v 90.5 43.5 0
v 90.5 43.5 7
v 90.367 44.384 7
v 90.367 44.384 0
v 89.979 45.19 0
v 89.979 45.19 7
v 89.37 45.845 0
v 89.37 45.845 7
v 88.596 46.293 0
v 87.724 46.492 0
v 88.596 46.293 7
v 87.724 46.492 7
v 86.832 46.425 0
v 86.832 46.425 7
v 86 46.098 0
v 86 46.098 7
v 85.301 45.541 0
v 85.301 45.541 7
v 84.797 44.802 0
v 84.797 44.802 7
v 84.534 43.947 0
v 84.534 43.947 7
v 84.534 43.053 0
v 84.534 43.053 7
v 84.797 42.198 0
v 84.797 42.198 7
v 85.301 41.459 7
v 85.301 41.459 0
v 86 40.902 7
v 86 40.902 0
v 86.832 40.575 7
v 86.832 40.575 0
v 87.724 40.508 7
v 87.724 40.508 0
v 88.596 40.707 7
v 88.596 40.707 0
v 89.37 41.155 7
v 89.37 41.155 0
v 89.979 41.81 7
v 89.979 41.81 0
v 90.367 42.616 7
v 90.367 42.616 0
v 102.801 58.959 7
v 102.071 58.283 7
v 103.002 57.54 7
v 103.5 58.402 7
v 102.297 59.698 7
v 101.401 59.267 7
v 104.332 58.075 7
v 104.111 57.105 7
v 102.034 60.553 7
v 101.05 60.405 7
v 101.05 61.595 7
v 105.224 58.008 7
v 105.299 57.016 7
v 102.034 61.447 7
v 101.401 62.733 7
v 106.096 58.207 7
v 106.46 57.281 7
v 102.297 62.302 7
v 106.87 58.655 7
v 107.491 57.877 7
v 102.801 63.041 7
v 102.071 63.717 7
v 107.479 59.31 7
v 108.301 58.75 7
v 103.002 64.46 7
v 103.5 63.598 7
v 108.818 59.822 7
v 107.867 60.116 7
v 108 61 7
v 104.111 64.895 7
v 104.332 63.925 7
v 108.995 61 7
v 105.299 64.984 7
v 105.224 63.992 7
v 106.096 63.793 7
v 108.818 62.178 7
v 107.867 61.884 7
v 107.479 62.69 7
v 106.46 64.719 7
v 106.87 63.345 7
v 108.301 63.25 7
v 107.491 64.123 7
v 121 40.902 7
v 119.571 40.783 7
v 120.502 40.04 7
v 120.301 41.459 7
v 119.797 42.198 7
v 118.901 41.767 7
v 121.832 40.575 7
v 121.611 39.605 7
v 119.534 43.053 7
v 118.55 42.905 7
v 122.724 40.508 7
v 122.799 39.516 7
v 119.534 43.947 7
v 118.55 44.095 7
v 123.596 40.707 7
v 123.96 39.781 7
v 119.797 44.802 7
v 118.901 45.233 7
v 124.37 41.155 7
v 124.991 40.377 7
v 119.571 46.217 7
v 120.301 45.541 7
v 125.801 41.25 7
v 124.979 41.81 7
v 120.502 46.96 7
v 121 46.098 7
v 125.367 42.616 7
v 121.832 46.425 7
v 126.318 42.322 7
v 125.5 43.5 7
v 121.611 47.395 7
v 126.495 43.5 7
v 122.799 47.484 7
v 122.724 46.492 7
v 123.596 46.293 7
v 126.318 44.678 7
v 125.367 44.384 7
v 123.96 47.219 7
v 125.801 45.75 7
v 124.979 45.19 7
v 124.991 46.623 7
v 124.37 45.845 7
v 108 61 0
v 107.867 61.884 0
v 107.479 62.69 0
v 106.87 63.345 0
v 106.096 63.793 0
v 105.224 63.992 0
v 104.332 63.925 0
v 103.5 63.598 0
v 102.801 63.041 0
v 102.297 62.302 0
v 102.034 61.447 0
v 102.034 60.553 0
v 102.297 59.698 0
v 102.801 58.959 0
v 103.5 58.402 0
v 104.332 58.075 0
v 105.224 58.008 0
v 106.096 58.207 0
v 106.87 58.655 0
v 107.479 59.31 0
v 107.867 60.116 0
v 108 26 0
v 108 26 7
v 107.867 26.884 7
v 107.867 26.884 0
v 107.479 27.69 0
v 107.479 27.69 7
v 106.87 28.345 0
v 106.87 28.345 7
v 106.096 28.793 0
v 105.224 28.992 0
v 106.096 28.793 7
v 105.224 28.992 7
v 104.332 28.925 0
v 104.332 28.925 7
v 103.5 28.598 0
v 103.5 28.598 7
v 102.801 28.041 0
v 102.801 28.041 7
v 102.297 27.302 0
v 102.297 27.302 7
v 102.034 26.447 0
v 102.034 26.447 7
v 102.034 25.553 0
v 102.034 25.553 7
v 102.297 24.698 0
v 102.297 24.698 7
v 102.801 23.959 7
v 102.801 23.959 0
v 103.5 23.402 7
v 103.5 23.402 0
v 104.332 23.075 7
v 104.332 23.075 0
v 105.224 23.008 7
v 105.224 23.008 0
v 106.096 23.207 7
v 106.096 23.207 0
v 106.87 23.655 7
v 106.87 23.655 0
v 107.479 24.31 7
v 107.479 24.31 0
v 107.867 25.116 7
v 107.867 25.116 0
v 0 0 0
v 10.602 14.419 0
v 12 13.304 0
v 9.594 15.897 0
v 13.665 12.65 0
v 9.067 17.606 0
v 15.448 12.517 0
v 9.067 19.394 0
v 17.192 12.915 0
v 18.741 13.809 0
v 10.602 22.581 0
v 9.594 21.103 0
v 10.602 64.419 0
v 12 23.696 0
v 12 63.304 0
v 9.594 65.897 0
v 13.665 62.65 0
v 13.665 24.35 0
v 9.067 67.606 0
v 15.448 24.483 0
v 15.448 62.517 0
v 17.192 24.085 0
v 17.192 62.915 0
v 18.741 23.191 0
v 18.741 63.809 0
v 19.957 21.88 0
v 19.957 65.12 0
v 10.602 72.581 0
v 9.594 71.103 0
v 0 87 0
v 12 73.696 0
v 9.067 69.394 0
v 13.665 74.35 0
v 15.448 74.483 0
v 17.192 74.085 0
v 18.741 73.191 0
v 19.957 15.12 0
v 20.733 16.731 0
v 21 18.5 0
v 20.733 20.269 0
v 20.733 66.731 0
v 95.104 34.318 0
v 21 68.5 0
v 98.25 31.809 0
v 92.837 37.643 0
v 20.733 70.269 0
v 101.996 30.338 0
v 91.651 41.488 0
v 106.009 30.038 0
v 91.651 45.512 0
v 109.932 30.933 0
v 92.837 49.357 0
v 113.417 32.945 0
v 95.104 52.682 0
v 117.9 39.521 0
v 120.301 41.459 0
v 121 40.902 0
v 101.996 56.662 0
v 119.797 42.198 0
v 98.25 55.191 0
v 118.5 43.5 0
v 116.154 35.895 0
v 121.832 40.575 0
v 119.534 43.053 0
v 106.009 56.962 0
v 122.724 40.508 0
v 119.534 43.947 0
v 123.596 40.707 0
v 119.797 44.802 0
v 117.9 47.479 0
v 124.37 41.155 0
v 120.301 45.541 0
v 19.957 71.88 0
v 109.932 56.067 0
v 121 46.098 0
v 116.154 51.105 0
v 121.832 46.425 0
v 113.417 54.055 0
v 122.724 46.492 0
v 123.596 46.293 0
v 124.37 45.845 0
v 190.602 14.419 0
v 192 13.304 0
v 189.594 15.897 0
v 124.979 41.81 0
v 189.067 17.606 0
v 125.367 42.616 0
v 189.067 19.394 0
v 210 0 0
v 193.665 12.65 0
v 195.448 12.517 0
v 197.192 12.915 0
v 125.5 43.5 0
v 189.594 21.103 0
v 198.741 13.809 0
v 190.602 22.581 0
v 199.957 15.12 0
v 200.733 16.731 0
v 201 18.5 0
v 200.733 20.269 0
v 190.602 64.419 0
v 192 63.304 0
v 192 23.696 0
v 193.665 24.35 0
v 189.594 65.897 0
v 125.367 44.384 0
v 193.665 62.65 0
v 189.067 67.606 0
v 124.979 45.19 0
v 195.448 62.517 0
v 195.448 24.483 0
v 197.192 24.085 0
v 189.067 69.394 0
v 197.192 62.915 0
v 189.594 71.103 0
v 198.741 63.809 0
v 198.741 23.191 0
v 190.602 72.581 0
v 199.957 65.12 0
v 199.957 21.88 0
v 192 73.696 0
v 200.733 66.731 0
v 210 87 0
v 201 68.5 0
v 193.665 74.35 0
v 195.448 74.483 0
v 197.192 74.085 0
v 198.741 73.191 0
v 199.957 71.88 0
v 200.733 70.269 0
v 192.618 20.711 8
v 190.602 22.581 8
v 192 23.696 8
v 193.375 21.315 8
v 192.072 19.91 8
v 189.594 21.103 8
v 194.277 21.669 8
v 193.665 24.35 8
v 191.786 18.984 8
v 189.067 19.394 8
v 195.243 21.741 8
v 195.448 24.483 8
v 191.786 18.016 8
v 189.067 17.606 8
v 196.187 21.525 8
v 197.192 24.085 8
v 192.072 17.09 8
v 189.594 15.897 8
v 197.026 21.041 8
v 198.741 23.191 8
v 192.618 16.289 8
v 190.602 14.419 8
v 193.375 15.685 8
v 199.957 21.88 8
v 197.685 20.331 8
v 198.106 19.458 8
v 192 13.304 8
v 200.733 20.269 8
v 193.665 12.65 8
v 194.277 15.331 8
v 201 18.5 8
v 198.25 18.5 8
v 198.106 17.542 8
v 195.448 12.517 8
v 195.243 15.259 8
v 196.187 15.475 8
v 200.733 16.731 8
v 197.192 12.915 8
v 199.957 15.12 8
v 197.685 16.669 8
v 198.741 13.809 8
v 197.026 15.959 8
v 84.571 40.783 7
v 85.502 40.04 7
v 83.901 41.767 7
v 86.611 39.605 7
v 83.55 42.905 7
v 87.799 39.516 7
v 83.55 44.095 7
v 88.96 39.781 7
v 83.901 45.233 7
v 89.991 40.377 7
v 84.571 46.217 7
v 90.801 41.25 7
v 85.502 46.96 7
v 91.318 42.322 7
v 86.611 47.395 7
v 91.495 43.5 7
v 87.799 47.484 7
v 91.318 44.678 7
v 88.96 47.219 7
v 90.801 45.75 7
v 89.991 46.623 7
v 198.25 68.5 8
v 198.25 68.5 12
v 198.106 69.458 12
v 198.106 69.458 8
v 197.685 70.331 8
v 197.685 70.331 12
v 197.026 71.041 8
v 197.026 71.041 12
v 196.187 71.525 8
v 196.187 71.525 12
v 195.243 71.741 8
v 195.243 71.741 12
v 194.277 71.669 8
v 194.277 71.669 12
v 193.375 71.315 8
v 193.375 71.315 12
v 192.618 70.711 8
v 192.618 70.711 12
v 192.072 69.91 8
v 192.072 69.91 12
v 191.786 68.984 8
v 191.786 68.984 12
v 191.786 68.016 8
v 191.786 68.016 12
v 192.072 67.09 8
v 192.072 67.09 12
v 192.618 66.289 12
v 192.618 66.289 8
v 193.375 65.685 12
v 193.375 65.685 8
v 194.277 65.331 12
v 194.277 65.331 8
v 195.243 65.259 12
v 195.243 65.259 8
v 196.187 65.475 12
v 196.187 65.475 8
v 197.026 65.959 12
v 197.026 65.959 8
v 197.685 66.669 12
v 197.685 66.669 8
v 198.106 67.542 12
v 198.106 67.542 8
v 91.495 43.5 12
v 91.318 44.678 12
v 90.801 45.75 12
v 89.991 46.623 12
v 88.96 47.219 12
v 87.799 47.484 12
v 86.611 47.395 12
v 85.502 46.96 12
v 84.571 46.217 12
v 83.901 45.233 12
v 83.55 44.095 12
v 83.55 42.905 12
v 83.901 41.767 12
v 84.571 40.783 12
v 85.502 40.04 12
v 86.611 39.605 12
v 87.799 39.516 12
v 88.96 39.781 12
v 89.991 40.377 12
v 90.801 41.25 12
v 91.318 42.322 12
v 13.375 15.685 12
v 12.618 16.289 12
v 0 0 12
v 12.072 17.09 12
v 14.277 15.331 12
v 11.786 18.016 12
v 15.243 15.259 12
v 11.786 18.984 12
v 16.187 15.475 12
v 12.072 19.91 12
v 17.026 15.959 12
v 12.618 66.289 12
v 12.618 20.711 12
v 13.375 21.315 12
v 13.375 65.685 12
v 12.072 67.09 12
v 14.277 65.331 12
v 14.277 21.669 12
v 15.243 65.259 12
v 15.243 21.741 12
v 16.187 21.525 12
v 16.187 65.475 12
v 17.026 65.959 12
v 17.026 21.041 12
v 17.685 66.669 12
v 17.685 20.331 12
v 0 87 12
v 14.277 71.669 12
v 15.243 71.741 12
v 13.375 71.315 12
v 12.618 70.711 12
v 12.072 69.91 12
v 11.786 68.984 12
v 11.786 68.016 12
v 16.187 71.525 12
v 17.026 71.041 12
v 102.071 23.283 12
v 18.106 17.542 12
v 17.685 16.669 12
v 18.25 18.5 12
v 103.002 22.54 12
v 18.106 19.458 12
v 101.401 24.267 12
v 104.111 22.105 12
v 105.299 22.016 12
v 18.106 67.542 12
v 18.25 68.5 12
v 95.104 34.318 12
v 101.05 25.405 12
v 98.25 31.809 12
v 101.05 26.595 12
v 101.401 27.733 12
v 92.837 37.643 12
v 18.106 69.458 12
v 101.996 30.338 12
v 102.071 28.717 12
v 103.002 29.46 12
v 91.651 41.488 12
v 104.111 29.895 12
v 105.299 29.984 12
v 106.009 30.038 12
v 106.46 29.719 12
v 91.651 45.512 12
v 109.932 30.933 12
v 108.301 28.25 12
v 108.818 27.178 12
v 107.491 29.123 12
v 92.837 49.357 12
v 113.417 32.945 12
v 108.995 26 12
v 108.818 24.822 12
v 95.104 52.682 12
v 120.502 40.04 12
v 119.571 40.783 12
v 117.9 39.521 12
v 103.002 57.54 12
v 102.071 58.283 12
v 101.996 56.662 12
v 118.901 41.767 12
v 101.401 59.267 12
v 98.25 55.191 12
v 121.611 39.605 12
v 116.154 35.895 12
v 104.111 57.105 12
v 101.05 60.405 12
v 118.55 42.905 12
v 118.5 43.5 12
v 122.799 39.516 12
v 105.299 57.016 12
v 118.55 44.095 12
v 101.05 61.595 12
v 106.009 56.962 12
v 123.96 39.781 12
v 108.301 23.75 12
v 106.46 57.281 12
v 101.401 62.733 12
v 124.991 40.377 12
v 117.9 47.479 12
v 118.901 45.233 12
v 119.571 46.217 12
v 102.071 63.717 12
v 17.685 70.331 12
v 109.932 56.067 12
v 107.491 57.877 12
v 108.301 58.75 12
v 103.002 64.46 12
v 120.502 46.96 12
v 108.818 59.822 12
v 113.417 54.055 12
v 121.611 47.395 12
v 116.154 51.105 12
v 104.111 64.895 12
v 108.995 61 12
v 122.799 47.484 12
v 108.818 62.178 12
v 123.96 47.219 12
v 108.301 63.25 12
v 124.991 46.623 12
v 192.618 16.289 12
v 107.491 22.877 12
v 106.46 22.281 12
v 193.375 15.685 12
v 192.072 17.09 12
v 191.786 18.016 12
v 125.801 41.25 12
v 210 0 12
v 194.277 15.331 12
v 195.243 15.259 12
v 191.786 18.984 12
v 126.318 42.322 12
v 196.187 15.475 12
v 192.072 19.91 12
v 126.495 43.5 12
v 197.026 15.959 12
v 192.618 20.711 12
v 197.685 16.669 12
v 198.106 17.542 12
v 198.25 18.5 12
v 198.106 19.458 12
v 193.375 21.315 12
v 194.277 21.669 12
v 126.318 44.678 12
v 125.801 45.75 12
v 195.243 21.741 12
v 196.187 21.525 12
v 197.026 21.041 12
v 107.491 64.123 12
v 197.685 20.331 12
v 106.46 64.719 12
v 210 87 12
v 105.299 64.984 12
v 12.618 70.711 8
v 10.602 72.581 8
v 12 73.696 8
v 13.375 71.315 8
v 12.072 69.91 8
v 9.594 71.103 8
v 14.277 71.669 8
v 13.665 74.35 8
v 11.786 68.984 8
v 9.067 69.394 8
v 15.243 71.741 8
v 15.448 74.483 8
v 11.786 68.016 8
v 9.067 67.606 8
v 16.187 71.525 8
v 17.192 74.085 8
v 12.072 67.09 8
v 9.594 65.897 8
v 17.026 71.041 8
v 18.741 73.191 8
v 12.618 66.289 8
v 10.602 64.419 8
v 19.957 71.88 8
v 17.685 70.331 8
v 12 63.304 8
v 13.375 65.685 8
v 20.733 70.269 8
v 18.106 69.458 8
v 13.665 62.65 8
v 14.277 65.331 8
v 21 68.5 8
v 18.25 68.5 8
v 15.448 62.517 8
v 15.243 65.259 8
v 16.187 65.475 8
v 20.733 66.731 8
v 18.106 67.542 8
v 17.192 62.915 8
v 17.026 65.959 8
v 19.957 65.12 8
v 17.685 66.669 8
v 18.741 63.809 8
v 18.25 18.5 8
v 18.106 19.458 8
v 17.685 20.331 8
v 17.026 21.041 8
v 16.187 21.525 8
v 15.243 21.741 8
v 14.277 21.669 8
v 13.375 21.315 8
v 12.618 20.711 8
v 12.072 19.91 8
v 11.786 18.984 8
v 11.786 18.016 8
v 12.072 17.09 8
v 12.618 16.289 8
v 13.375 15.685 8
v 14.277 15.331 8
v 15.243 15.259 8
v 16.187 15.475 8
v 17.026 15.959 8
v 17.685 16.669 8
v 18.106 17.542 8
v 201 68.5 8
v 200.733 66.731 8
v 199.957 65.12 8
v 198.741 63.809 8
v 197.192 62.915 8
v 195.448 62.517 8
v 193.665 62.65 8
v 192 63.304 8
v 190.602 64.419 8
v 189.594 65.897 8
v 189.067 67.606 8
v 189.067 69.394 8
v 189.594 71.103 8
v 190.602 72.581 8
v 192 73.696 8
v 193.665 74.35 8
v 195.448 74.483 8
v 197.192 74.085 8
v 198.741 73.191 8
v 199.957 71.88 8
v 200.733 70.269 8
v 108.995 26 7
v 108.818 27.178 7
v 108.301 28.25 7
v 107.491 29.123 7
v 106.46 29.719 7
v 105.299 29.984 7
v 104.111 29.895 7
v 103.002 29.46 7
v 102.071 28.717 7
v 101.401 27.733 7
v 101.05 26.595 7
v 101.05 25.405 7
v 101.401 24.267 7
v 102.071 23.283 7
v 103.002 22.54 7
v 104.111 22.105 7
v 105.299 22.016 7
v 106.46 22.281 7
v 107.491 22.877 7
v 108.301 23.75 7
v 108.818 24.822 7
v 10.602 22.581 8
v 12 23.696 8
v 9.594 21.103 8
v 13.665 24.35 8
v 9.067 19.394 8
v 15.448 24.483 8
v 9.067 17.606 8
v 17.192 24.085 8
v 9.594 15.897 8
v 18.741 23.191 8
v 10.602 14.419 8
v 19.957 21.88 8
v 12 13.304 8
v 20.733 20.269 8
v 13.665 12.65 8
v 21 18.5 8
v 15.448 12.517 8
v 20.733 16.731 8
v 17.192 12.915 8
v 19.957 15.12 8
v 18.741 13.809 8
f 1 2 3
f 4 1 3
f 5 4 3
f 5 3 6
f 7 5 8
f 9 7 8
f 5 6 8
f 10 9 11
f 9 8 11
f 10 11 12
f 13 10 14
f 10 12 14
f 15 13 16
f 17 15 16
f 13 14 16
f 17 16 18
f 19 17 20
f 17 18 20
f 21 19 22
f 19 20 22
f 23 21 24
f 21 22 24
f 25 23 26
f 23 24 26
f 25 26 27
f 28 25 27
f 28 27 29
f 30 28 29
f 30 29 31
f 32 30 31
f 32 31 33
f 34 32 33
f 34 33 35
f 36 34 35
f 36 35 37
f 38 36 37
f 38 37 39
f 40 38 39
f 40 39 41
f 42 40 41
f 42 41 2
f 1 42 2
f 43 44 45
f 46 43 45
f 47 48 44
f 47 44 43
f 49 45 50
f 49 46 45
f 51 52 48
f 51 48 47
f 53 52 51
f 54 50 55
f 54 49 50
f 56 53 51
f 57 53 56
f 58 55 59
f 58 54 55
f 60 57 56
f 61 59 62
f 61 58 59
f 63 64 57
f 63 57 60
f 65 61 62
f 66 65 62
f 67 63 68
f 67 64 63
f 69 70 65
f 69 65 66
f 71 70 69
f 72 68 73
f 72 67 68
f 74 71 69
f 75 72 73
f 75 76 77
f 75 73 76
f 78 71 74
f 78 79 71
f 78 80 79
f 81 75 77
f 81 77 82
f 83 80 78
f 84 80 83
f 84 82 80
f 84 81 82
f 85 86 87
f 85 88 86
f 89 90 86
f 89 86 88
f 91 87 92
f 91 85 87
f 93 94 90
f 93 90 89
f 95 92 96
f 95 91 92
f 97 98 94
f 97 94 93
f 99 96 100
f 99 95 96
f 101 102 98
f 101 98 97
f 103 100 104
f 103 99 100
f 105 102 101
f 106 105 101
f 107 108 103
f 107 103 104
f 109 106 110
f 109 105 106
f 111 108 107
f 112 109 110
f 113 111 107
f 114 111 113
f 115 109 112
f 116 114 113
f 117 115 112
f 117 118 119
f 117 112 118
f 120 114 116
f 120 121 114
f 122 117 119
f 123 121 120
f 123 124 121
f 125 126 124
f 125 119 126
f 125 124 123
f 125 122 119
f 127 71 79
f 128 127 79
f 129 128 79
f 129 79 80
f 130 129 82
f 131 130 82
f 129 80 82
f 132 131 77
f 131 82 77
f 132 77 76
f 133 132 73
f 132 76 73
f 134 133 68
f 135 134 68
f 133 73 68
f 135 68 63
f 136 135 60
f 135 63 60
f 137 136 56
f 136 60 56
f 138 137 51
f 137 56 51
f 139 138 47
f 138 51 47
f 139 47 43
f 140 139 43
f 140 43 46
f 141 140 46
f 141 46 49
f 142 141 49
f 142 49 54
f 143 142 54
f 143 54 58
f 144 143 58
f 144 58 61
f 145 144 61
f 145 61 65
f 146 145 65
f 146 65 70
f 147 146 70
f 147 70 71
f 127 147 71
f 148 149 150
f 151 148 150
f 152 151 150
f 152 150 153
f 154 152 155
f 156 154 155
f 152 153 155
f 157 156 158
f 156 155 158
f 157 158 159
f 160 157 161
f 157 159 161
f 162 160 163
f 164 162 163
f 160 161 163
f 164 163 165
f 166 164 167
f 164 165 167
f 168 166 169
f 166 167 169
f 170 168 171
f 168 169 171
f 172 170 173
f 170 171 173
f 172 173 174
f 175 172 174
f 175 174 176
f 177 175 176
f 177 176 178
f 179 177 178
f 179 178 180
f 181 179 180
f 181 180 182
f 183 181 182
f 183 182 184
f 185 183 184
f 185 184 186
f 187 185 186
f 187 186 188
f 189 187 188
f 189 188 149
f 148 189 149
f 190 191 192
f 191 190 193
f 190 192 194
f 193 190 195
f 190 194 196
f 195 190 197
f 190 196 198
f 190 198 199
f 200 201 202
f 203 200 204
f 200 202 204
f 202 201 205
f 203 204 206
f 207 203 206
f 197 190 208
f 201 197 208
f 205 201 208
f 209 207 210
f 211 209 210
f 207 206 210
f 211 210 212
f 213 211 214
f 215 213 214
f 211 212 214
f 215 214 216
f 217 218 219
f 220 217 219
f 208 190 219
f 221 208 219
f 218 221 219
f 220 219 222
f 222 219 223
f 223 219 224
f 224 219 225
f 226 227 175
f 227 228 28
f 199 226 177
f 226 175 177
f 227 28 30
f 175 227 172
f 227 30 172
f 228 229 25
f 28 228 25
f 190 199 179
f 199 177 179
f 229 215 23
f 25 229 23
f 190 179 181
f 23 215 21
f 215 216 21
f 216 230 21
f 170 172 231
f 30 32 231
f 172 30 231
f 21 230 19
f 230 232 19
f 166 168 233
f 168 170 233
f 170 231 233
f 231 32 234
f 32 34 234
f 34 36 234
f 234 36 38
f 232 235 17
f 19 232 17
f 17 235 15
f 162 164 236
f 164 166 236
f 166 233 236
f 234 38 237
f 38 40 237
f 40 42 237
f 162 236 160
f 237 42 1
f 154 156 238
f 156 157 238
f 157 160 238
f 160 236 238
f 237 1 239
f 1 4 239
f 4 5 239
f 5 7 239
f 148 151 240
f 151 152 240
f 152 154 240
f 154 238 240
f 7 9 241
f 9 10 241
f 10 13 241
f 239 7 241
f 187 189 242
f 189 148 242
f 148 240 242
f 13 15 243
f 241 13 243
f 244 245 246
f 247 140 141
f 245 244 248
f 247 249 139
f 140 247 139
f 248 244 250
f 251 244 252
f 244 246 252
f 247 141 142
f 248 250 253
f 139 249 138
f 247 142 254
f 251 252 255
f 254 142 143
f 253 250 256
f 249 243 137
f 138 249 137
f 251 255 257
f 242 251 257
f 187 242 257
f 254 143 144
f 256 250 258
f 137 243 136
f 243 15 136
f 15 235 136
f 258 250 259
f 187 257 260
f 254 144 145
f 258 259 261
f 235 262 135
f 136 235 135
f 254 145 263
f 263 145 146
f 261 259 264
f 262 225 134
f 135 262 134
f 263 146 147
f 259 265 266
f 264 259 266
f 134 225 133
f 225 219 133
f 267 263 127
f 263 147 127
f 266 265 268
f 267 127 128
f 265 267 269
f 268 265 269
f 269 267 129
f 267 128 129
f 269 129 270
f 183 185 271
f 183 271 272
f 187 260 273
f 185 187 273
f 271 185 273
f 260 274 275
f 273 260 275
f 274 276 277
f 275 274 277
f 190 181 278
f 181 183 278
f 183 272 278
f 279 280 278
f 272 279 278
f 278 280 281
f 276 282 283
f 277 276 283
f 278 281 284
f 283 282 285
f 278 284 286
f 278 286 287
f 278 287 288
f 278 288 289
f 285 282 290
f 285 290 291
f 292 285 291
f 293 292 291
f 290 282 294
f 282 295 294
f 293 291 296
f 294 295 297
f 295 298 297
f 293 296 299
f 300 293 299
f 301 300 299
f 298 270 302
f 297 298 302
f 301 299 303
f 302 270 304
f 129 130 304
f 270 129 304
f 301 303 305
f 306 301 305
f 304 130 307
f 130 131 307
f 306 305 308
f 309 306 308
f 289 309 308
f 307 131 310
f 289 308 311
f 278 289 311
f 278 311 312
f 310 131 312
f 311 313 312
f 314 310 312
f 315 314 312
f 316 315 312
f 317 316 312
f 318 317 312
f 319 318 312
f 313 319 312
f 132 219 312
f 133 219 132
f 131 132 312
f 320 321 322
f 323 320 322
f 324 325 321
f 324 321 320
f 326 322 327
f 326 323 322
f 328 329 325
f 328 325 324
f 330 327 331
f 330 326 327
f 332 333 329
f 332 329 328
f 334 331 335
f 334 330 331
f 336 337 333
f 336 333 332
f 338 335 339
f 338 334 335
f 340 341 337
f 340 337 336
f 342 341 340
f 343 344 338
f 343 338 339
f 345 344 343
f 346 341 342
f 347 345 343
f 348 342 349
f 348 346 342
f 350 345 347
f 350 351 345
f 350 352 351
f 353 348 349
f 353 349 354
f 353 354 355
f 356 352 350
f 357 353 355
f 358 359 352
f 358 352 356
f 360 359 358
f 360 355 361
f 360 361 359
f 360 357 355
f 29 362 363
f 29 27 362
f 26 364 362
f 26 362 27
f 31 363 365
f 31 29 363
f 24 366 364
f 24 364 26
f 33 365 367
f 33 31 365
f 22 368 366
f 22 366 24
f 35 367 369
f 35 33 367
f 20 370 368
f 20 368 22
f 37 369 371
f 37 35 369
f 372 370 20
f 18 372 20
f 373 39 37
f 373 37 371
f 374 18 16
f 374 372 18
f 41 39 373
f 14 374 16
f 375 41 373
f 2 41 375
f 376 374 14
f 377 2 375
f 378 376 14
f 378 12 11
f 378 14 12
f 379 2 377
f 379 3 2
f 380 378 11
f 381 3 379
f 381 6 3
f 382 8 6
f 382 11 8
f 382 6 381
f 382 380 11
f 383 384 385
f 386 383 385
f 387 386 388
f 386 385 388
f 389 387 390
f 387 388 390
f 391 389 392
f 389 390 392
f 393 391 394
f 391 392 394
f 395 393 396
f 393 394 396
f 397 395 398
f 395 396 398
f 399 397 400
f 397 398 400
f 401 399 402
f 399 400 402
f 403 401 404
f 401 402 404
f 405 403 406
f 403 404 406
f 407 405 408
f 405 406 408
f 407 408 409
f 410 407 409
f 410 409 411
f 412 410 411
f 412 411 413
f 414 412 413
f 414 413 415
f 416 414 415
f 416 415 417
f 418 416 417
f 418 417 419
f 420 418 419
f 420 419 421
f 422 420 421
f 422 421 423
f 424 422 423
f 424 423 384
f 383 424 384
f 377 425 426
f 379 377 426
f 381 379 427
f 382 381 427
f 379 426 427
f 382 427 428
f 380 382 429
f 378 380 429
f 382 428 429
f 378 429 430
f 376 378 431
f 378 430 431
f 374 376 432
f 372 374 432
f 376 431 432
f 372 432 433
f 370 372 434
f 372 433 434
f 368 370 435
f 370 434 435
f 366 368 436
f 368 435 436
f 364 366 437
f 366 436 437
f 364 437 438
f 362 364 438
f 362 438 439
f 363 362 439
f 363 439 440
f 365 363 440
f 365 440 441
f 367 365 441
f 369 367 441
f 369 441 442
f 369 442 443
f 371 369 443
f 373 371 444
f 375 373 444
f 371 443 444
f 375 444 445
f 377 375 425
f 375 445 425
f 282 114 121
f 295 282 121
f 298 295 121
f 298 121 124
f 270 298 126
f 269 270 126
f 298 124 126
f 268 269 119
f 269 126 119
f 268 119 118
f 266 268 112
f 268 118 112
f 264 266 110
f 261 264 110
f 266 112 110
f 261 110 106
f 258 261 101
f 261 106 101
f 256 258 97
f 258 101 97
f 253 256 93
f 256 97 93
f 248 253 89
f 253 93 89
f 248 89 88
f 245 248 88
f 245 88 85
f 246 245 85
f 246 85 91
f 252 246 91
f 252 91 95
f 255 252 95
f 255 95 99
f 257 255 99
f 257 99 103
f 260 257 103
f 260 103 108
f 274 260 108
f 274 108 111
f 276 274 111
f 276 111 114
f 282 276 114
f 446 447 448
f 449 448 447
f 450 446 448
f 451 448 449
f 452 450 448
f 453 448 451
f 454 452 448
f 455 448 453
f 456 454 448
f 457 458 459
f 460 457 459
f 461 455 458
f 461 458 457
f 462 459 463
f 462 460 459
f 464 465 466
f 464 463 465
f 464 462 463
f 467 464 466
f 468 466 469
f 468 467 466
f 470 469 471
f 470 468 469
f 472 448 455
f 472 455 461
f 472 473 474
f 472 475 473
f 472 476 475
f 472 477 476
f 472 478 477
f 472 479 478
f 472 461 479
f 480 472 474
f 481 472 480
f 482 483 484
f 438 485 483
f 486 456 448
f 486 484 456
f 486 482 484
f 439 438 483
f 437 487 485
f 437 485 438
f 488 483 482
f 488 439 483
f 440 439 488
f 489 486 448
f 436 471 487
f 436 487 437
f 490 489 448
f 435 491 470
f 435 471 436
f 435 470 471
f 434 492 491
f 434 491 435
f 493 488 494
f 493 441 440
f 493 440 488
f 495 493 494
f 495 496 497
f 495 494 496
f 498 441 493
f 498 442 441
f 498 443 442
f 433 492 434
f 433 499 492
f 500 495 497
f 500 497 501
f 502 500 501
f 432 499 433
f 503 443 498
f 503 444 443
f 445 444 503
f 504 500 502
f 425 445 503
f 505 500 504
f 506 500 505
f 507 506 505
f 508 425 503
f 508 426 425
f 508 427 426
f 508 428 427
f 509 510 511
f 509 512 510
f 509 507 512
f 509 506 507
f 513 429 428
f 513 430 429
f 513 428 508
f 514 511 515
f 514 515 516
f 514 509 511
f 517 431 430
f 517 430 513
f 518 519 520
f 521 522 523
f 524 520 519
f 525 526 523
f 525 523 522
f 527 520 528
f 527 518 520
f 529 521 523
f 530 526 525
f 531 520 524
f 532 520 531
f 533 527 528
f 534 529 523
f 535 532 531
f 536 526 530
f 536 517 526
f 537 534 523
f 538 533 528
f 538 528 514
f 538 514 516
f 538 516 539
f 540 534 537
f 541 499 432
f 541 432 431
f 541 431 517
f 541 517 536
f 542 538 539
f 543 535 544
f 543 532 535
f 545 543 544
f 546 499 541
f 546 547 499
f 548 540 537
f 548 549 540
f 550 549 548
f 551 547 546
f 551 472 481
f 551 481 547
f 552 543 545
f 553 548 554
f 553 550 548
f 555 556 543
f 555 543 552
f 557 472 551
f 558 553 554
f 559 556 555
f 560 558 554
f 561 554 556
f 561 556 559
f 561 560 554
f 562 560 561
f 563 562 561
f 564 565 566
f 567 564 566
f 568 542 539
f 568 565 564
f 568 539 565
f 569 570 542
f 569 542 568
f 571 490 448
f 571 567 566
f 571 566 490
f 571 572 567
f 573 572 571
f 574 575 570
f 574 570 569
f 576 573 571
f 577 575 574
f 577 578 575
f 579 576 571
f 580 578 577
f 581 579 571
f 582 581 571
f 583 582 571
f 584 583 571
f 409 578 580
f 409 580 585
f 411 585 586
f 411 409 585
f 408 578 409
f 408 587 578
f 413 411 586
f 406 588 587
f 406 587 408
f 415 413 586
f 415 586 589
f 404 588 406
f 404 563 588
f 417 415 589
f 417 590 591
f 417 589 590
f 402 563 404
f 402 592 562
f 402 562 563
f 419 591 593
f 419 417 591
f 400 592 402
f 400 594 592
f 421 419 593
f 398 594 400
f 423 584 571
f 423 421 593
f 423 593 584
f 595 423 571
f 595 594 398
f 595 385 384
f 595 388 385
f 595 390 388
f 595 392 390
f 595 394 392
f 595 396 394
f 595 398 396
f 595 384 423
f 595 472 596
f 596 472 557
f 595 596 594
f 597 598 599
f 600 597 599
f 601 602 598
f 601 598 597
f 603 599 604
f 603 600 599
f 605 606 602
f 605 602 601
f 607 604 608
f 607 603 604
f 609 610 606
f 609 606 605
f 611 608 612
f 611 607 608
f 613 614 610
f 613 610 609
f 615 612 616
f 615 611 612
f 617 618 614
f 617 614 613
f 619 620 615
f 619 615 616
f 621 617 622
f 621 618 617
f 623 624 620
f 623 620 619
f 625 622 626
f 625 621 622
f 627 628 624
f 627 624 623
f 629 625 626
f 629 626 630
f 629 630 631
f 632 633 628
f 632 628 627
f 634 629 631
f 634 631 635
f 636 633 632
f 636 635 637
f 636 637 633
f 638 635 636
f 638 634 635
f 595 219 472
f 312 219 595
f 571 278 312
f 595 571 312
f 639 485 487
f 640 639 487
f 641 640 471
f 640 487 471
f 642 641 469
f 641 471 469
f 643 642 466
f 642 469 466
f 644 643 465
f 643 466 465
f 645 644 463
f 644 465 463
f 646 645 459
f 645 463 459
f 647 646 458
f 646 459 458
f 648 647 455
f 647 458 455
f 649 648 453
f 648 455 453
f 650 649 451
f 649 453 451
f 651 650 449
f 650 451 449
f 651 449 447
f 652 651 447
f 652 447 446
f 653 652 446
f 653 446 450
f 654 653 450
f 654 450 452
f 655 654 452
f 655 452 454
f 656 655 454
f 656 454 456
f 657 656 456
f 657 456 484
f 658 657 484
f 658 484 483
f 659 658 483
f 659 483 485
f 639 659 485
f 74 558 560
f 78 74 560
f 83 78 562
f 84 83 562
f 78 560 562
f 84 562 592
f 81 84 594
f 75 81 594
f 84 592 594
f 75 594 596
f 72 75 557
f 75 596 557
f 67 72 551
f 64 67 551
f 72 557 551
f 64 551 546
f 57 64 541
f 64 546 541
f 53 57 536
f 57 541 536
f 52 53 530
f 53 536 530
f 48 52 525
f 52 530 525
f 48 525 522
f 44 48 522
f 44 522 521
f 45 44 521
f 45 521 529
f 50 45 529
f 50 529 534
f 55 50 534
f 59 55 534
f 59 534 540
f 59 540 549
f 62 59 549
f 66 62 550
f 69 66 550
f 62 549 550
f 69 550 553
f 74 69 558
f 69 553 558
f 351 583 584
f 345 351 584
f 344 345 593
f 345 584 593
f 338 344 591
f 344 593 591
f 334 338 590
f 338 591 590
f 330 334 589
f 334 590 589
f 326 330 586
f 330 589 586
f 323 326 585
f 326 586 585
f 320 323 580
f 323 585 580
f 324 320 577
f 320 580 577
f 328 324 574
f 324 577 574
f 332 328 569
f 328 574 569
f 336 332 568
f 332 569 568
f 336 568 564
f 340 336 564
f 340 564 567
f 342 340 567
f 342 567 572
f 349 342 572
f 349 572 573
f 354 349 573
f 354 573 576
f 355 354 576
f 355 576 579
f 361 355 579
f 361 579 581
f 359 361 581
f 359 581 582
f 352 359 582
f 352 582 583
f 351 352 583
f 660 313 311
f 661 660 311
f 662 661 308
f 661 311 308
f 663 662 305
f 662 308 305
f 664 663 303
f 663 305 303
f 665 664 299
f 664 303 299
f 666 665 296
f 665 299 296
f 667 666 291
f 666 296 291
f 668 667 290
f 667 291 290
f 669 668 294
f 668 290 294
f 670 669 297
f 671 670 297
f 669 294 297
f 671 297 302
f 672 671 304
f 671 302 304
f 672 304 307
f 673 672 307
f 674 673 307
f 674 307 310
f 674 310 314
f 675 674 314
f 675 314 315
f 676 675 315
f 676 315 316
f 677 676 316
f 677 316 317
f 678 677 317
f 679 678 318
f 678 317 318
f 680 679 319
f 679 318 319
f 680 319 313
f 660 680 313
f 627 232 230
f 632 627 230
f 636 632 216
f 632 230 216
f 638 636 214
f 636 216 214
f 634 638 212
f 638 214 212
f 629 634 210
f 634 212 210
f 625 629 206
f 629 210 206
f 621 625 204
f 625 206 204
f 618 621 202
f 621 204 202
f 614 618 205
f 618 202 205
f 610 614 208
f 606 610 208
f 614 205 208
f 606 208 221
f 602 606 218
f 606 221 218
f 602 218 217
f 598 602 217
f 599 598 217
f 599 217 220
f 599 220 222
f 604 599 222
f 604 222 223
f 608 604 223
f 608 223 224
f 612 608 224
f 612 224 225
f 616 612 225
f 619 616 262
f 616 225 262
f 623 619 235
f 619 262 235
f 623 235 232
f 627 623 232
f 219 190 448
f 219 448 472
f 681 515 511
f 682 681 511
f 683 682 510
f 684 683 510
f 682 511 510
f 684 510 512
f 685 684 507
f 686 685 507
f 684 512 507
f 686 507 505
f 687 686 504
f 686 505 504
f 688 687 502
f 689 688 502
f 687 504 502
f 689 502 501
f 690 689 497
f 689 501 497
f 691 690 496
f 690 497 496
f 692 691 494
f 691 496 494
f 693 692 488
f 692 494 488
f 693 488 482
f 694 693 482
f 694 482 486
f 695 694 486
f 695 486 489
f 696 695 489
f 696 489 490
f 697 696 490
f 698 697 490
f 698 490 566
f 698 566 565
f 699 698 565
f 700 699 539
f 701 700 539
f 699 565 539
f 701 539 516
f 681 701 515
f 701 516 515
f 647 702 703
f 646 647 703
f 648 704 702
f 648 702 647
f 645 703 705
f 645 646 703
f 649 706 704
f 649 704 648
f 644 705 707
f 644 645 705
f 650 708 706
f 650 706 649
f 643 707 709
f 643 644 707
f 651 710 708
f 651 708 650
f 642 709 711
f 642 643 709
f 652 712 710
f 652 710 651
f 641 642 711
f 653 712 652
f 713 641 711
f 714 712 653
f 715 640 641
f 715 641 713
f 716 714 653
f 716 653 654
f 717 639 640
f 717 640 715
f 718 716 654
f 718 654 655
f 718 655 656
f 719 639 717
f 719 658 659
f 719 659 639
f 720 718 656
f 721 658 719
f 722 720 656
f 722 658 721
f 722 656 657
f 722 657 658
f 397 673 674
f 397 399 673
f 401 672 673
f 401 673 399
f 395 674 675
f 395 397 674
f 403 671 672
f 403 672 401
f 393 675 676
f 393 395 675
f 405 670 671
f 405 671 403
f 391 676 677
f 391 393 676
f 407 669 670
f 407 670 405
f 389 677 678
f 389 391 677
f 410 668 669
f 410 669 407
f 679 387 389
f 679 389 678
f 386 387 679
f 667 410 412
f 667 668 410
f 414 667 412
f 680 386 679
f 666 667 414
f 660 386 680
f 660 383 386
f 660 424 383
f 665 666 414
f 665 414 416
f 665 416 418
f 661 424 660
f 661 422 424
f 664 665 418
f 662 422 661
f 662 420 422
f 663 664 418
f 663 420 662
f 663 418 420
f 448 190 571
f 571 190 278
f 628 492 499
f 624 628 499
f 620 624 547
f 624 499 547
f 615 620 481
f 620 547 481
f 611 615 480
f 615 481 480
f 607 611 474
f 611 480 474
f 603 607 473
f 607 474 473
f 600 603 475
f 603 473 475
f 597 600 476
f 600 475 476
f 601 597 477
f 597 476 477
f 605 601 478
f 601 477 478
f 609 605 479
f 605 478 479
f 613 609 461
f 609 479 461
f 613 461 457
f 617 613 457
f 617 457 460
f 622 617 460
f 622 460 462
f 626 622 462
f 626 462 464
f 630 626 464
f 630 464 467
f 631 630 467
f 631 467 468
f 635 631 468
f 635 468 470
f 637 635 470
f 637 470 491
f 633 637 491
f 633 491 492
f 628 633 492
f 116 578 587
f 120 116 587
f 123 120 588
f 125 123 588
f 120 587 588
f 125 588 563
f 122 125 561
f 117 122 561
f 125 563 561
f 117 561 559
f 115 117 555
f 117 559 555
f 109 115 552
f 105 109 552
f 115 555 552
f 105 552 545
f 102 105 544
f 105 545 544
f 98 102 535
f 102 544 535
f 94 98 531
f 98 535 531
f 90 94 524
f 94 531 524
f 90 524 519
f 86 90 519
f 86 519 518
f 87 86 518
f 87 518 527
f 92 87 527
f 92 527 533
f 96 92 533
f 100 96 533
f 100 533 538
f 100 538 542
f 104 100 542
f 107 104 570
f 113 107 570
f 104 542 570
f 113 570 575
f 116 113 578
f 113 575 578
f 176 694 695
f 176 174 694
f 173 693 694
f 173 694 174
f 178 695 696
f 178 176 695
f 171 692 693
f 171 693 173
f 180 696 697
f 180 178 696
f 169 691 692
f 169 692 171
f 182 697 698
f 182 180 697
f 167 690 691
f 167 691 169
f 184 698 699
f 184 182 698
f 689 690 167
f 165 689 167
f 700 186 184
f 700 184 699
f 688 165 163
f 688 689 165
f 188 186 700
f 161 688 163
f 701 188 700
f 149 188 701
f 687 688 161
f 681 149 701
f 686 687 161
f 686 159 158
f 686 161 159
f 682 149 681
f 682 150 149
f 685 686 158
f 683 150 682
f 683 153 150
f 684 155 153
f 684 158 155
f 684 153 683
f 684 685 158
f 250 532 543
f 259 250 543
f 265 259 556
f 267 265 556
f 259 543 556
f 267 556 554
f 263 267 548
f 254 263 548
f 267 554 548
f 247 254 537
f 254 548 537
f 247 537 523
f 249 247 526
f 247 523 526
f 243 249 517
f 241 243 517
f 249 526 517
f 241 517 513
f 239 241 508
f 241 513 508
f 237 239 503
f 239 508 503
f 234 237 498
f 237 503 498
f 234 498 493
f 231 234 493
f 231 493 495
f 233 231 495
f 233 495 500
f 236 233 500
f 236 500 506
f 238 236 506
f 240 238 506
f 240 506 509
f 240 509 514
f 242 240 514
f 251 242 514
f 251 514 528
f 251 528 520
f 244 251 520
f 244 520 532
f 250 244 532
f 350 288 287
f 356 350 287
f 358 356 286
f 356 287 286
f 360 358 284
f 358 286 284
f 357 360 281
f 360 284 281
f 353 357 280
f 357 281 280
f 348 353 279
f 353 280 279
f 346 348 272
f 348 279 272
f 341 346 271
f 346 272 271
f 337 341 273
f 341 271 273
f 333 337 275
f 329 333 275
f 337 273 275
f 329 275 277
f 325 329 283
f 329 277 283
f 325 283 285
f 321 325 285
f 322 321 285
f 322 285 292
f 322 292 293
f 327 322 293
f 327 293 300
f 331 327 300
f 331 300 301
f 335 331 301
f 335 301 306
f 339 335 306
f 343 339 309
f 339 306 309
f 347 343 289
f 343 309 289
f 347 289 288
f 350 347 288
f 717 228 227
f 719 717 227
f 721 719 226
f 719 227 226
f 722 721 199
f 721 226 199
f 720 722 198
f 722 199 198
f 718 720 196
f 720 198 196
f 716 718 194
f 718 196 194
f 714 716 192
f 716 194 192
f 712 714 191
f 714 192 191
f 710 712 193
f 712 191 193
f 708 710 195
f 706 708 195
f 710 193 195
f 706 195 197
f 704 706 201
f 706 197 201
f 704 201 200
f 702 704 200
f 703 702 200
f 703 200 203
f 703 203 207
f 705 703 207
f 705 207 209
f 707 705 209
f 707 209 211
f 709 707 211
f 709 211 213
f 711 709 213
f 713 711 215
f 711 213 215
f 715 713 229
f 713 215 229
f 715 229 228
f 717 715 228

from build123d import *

# Parameters (mm, degrees)
F0_W      = 210
F0_H      = 87
F1_DEPTH  = 12
F2_R      = 3.25
F3_DEPTH  = 12.001
F4_R      = 13.5
F5_DEPTH  = 12.001
F6_R      = 3
F7_DEPTH  = 12.001
F8_R      = 3.995
F9_DEPTH  = 5
F10_R     = 6
F11_DEPTH = 8


with BuildPart() as f1:
    # F0 (on Top) → F1 (new body)
    with BuildSketch(Plane.XY):
        with Locations((105, 43.5)):
            Rectangle(F0_W, F0_H)
    extrude(amount=F1_DEPTH)

    # F2 (on face) → F3 (cut, through all)
    with BuildSketch(Plane.XY.offset(12)):
        with Locations((15, 68.5)):
            Circle(F2_R)
        with Locations((195, 68.5)):
            Circle(F2_R)
        with Locations((195, 18.5)):
            Circle(F2_R)
        with Locations((15, 18.5)):
            Circle(F2_R)
    extrude(amount=-F3_DEPTH, mode=Mode.SUBTRACT)

    # F4 (on face) → F5 (cut, through all)
    with BuildSketch(Plane.XY.offset(12)):
        with Locations((105, 43.5)):
            Circle(F4_R)
    extrude(amount=-F5_DEPTH, mode=Mode.SUBTRACT)

    # F6 (on face) → F7 (cut, through all)
    with BuildSketch(Plane.XY.offset(12)):
        with Locations((105, 61)):
            Circle(F6_R)
        with Locations((87.5, 43.5)):
            Circle(F6_R)
        with Locations((105, 26)):
            Circle(F6_R)
        with Locations((122.5, 43.5)):
            Circle(F6_R)
    extrude(amount=-F7_DEPTH, mode=Mode.SUBTRACT)

    # F8 (on face) → F9 (cut)
    with BuildSketch(Plane.XY.offset(12)):
        with Locations((105, 61)):
            Circle(F8_R)
        with Locations((87.5, 43.5)):
            Circle(F8_R)
        with Locations((105, 26)):
            Circle(F8_R)
        with Locations((122.5, 43.5)):
            Circle(F8_R)
    extrude(amount=-F9_DEPTH, mode=Mode.SUBTRACT)

    # F10 (on face) → F11 (cut)
    with BuildSketch(Plane(origin=(0, 0, 0), x_dir=(1, 0, 0), z_dir=(0, 0, -1))):
        with Locations((15, -18.5)):
            Circle(F10_R)
        with Locations((15, -68.5)):
            Circle(F10_R)
        with Locations((195, -18.5)):
            Circle(F10_R)
        with Locations((195, -68.5)):
            Circle(F10_R)
    extrude(amount=-F11_DEPTH, mode=Mode.SUBTRACT)


solid = f1.part
